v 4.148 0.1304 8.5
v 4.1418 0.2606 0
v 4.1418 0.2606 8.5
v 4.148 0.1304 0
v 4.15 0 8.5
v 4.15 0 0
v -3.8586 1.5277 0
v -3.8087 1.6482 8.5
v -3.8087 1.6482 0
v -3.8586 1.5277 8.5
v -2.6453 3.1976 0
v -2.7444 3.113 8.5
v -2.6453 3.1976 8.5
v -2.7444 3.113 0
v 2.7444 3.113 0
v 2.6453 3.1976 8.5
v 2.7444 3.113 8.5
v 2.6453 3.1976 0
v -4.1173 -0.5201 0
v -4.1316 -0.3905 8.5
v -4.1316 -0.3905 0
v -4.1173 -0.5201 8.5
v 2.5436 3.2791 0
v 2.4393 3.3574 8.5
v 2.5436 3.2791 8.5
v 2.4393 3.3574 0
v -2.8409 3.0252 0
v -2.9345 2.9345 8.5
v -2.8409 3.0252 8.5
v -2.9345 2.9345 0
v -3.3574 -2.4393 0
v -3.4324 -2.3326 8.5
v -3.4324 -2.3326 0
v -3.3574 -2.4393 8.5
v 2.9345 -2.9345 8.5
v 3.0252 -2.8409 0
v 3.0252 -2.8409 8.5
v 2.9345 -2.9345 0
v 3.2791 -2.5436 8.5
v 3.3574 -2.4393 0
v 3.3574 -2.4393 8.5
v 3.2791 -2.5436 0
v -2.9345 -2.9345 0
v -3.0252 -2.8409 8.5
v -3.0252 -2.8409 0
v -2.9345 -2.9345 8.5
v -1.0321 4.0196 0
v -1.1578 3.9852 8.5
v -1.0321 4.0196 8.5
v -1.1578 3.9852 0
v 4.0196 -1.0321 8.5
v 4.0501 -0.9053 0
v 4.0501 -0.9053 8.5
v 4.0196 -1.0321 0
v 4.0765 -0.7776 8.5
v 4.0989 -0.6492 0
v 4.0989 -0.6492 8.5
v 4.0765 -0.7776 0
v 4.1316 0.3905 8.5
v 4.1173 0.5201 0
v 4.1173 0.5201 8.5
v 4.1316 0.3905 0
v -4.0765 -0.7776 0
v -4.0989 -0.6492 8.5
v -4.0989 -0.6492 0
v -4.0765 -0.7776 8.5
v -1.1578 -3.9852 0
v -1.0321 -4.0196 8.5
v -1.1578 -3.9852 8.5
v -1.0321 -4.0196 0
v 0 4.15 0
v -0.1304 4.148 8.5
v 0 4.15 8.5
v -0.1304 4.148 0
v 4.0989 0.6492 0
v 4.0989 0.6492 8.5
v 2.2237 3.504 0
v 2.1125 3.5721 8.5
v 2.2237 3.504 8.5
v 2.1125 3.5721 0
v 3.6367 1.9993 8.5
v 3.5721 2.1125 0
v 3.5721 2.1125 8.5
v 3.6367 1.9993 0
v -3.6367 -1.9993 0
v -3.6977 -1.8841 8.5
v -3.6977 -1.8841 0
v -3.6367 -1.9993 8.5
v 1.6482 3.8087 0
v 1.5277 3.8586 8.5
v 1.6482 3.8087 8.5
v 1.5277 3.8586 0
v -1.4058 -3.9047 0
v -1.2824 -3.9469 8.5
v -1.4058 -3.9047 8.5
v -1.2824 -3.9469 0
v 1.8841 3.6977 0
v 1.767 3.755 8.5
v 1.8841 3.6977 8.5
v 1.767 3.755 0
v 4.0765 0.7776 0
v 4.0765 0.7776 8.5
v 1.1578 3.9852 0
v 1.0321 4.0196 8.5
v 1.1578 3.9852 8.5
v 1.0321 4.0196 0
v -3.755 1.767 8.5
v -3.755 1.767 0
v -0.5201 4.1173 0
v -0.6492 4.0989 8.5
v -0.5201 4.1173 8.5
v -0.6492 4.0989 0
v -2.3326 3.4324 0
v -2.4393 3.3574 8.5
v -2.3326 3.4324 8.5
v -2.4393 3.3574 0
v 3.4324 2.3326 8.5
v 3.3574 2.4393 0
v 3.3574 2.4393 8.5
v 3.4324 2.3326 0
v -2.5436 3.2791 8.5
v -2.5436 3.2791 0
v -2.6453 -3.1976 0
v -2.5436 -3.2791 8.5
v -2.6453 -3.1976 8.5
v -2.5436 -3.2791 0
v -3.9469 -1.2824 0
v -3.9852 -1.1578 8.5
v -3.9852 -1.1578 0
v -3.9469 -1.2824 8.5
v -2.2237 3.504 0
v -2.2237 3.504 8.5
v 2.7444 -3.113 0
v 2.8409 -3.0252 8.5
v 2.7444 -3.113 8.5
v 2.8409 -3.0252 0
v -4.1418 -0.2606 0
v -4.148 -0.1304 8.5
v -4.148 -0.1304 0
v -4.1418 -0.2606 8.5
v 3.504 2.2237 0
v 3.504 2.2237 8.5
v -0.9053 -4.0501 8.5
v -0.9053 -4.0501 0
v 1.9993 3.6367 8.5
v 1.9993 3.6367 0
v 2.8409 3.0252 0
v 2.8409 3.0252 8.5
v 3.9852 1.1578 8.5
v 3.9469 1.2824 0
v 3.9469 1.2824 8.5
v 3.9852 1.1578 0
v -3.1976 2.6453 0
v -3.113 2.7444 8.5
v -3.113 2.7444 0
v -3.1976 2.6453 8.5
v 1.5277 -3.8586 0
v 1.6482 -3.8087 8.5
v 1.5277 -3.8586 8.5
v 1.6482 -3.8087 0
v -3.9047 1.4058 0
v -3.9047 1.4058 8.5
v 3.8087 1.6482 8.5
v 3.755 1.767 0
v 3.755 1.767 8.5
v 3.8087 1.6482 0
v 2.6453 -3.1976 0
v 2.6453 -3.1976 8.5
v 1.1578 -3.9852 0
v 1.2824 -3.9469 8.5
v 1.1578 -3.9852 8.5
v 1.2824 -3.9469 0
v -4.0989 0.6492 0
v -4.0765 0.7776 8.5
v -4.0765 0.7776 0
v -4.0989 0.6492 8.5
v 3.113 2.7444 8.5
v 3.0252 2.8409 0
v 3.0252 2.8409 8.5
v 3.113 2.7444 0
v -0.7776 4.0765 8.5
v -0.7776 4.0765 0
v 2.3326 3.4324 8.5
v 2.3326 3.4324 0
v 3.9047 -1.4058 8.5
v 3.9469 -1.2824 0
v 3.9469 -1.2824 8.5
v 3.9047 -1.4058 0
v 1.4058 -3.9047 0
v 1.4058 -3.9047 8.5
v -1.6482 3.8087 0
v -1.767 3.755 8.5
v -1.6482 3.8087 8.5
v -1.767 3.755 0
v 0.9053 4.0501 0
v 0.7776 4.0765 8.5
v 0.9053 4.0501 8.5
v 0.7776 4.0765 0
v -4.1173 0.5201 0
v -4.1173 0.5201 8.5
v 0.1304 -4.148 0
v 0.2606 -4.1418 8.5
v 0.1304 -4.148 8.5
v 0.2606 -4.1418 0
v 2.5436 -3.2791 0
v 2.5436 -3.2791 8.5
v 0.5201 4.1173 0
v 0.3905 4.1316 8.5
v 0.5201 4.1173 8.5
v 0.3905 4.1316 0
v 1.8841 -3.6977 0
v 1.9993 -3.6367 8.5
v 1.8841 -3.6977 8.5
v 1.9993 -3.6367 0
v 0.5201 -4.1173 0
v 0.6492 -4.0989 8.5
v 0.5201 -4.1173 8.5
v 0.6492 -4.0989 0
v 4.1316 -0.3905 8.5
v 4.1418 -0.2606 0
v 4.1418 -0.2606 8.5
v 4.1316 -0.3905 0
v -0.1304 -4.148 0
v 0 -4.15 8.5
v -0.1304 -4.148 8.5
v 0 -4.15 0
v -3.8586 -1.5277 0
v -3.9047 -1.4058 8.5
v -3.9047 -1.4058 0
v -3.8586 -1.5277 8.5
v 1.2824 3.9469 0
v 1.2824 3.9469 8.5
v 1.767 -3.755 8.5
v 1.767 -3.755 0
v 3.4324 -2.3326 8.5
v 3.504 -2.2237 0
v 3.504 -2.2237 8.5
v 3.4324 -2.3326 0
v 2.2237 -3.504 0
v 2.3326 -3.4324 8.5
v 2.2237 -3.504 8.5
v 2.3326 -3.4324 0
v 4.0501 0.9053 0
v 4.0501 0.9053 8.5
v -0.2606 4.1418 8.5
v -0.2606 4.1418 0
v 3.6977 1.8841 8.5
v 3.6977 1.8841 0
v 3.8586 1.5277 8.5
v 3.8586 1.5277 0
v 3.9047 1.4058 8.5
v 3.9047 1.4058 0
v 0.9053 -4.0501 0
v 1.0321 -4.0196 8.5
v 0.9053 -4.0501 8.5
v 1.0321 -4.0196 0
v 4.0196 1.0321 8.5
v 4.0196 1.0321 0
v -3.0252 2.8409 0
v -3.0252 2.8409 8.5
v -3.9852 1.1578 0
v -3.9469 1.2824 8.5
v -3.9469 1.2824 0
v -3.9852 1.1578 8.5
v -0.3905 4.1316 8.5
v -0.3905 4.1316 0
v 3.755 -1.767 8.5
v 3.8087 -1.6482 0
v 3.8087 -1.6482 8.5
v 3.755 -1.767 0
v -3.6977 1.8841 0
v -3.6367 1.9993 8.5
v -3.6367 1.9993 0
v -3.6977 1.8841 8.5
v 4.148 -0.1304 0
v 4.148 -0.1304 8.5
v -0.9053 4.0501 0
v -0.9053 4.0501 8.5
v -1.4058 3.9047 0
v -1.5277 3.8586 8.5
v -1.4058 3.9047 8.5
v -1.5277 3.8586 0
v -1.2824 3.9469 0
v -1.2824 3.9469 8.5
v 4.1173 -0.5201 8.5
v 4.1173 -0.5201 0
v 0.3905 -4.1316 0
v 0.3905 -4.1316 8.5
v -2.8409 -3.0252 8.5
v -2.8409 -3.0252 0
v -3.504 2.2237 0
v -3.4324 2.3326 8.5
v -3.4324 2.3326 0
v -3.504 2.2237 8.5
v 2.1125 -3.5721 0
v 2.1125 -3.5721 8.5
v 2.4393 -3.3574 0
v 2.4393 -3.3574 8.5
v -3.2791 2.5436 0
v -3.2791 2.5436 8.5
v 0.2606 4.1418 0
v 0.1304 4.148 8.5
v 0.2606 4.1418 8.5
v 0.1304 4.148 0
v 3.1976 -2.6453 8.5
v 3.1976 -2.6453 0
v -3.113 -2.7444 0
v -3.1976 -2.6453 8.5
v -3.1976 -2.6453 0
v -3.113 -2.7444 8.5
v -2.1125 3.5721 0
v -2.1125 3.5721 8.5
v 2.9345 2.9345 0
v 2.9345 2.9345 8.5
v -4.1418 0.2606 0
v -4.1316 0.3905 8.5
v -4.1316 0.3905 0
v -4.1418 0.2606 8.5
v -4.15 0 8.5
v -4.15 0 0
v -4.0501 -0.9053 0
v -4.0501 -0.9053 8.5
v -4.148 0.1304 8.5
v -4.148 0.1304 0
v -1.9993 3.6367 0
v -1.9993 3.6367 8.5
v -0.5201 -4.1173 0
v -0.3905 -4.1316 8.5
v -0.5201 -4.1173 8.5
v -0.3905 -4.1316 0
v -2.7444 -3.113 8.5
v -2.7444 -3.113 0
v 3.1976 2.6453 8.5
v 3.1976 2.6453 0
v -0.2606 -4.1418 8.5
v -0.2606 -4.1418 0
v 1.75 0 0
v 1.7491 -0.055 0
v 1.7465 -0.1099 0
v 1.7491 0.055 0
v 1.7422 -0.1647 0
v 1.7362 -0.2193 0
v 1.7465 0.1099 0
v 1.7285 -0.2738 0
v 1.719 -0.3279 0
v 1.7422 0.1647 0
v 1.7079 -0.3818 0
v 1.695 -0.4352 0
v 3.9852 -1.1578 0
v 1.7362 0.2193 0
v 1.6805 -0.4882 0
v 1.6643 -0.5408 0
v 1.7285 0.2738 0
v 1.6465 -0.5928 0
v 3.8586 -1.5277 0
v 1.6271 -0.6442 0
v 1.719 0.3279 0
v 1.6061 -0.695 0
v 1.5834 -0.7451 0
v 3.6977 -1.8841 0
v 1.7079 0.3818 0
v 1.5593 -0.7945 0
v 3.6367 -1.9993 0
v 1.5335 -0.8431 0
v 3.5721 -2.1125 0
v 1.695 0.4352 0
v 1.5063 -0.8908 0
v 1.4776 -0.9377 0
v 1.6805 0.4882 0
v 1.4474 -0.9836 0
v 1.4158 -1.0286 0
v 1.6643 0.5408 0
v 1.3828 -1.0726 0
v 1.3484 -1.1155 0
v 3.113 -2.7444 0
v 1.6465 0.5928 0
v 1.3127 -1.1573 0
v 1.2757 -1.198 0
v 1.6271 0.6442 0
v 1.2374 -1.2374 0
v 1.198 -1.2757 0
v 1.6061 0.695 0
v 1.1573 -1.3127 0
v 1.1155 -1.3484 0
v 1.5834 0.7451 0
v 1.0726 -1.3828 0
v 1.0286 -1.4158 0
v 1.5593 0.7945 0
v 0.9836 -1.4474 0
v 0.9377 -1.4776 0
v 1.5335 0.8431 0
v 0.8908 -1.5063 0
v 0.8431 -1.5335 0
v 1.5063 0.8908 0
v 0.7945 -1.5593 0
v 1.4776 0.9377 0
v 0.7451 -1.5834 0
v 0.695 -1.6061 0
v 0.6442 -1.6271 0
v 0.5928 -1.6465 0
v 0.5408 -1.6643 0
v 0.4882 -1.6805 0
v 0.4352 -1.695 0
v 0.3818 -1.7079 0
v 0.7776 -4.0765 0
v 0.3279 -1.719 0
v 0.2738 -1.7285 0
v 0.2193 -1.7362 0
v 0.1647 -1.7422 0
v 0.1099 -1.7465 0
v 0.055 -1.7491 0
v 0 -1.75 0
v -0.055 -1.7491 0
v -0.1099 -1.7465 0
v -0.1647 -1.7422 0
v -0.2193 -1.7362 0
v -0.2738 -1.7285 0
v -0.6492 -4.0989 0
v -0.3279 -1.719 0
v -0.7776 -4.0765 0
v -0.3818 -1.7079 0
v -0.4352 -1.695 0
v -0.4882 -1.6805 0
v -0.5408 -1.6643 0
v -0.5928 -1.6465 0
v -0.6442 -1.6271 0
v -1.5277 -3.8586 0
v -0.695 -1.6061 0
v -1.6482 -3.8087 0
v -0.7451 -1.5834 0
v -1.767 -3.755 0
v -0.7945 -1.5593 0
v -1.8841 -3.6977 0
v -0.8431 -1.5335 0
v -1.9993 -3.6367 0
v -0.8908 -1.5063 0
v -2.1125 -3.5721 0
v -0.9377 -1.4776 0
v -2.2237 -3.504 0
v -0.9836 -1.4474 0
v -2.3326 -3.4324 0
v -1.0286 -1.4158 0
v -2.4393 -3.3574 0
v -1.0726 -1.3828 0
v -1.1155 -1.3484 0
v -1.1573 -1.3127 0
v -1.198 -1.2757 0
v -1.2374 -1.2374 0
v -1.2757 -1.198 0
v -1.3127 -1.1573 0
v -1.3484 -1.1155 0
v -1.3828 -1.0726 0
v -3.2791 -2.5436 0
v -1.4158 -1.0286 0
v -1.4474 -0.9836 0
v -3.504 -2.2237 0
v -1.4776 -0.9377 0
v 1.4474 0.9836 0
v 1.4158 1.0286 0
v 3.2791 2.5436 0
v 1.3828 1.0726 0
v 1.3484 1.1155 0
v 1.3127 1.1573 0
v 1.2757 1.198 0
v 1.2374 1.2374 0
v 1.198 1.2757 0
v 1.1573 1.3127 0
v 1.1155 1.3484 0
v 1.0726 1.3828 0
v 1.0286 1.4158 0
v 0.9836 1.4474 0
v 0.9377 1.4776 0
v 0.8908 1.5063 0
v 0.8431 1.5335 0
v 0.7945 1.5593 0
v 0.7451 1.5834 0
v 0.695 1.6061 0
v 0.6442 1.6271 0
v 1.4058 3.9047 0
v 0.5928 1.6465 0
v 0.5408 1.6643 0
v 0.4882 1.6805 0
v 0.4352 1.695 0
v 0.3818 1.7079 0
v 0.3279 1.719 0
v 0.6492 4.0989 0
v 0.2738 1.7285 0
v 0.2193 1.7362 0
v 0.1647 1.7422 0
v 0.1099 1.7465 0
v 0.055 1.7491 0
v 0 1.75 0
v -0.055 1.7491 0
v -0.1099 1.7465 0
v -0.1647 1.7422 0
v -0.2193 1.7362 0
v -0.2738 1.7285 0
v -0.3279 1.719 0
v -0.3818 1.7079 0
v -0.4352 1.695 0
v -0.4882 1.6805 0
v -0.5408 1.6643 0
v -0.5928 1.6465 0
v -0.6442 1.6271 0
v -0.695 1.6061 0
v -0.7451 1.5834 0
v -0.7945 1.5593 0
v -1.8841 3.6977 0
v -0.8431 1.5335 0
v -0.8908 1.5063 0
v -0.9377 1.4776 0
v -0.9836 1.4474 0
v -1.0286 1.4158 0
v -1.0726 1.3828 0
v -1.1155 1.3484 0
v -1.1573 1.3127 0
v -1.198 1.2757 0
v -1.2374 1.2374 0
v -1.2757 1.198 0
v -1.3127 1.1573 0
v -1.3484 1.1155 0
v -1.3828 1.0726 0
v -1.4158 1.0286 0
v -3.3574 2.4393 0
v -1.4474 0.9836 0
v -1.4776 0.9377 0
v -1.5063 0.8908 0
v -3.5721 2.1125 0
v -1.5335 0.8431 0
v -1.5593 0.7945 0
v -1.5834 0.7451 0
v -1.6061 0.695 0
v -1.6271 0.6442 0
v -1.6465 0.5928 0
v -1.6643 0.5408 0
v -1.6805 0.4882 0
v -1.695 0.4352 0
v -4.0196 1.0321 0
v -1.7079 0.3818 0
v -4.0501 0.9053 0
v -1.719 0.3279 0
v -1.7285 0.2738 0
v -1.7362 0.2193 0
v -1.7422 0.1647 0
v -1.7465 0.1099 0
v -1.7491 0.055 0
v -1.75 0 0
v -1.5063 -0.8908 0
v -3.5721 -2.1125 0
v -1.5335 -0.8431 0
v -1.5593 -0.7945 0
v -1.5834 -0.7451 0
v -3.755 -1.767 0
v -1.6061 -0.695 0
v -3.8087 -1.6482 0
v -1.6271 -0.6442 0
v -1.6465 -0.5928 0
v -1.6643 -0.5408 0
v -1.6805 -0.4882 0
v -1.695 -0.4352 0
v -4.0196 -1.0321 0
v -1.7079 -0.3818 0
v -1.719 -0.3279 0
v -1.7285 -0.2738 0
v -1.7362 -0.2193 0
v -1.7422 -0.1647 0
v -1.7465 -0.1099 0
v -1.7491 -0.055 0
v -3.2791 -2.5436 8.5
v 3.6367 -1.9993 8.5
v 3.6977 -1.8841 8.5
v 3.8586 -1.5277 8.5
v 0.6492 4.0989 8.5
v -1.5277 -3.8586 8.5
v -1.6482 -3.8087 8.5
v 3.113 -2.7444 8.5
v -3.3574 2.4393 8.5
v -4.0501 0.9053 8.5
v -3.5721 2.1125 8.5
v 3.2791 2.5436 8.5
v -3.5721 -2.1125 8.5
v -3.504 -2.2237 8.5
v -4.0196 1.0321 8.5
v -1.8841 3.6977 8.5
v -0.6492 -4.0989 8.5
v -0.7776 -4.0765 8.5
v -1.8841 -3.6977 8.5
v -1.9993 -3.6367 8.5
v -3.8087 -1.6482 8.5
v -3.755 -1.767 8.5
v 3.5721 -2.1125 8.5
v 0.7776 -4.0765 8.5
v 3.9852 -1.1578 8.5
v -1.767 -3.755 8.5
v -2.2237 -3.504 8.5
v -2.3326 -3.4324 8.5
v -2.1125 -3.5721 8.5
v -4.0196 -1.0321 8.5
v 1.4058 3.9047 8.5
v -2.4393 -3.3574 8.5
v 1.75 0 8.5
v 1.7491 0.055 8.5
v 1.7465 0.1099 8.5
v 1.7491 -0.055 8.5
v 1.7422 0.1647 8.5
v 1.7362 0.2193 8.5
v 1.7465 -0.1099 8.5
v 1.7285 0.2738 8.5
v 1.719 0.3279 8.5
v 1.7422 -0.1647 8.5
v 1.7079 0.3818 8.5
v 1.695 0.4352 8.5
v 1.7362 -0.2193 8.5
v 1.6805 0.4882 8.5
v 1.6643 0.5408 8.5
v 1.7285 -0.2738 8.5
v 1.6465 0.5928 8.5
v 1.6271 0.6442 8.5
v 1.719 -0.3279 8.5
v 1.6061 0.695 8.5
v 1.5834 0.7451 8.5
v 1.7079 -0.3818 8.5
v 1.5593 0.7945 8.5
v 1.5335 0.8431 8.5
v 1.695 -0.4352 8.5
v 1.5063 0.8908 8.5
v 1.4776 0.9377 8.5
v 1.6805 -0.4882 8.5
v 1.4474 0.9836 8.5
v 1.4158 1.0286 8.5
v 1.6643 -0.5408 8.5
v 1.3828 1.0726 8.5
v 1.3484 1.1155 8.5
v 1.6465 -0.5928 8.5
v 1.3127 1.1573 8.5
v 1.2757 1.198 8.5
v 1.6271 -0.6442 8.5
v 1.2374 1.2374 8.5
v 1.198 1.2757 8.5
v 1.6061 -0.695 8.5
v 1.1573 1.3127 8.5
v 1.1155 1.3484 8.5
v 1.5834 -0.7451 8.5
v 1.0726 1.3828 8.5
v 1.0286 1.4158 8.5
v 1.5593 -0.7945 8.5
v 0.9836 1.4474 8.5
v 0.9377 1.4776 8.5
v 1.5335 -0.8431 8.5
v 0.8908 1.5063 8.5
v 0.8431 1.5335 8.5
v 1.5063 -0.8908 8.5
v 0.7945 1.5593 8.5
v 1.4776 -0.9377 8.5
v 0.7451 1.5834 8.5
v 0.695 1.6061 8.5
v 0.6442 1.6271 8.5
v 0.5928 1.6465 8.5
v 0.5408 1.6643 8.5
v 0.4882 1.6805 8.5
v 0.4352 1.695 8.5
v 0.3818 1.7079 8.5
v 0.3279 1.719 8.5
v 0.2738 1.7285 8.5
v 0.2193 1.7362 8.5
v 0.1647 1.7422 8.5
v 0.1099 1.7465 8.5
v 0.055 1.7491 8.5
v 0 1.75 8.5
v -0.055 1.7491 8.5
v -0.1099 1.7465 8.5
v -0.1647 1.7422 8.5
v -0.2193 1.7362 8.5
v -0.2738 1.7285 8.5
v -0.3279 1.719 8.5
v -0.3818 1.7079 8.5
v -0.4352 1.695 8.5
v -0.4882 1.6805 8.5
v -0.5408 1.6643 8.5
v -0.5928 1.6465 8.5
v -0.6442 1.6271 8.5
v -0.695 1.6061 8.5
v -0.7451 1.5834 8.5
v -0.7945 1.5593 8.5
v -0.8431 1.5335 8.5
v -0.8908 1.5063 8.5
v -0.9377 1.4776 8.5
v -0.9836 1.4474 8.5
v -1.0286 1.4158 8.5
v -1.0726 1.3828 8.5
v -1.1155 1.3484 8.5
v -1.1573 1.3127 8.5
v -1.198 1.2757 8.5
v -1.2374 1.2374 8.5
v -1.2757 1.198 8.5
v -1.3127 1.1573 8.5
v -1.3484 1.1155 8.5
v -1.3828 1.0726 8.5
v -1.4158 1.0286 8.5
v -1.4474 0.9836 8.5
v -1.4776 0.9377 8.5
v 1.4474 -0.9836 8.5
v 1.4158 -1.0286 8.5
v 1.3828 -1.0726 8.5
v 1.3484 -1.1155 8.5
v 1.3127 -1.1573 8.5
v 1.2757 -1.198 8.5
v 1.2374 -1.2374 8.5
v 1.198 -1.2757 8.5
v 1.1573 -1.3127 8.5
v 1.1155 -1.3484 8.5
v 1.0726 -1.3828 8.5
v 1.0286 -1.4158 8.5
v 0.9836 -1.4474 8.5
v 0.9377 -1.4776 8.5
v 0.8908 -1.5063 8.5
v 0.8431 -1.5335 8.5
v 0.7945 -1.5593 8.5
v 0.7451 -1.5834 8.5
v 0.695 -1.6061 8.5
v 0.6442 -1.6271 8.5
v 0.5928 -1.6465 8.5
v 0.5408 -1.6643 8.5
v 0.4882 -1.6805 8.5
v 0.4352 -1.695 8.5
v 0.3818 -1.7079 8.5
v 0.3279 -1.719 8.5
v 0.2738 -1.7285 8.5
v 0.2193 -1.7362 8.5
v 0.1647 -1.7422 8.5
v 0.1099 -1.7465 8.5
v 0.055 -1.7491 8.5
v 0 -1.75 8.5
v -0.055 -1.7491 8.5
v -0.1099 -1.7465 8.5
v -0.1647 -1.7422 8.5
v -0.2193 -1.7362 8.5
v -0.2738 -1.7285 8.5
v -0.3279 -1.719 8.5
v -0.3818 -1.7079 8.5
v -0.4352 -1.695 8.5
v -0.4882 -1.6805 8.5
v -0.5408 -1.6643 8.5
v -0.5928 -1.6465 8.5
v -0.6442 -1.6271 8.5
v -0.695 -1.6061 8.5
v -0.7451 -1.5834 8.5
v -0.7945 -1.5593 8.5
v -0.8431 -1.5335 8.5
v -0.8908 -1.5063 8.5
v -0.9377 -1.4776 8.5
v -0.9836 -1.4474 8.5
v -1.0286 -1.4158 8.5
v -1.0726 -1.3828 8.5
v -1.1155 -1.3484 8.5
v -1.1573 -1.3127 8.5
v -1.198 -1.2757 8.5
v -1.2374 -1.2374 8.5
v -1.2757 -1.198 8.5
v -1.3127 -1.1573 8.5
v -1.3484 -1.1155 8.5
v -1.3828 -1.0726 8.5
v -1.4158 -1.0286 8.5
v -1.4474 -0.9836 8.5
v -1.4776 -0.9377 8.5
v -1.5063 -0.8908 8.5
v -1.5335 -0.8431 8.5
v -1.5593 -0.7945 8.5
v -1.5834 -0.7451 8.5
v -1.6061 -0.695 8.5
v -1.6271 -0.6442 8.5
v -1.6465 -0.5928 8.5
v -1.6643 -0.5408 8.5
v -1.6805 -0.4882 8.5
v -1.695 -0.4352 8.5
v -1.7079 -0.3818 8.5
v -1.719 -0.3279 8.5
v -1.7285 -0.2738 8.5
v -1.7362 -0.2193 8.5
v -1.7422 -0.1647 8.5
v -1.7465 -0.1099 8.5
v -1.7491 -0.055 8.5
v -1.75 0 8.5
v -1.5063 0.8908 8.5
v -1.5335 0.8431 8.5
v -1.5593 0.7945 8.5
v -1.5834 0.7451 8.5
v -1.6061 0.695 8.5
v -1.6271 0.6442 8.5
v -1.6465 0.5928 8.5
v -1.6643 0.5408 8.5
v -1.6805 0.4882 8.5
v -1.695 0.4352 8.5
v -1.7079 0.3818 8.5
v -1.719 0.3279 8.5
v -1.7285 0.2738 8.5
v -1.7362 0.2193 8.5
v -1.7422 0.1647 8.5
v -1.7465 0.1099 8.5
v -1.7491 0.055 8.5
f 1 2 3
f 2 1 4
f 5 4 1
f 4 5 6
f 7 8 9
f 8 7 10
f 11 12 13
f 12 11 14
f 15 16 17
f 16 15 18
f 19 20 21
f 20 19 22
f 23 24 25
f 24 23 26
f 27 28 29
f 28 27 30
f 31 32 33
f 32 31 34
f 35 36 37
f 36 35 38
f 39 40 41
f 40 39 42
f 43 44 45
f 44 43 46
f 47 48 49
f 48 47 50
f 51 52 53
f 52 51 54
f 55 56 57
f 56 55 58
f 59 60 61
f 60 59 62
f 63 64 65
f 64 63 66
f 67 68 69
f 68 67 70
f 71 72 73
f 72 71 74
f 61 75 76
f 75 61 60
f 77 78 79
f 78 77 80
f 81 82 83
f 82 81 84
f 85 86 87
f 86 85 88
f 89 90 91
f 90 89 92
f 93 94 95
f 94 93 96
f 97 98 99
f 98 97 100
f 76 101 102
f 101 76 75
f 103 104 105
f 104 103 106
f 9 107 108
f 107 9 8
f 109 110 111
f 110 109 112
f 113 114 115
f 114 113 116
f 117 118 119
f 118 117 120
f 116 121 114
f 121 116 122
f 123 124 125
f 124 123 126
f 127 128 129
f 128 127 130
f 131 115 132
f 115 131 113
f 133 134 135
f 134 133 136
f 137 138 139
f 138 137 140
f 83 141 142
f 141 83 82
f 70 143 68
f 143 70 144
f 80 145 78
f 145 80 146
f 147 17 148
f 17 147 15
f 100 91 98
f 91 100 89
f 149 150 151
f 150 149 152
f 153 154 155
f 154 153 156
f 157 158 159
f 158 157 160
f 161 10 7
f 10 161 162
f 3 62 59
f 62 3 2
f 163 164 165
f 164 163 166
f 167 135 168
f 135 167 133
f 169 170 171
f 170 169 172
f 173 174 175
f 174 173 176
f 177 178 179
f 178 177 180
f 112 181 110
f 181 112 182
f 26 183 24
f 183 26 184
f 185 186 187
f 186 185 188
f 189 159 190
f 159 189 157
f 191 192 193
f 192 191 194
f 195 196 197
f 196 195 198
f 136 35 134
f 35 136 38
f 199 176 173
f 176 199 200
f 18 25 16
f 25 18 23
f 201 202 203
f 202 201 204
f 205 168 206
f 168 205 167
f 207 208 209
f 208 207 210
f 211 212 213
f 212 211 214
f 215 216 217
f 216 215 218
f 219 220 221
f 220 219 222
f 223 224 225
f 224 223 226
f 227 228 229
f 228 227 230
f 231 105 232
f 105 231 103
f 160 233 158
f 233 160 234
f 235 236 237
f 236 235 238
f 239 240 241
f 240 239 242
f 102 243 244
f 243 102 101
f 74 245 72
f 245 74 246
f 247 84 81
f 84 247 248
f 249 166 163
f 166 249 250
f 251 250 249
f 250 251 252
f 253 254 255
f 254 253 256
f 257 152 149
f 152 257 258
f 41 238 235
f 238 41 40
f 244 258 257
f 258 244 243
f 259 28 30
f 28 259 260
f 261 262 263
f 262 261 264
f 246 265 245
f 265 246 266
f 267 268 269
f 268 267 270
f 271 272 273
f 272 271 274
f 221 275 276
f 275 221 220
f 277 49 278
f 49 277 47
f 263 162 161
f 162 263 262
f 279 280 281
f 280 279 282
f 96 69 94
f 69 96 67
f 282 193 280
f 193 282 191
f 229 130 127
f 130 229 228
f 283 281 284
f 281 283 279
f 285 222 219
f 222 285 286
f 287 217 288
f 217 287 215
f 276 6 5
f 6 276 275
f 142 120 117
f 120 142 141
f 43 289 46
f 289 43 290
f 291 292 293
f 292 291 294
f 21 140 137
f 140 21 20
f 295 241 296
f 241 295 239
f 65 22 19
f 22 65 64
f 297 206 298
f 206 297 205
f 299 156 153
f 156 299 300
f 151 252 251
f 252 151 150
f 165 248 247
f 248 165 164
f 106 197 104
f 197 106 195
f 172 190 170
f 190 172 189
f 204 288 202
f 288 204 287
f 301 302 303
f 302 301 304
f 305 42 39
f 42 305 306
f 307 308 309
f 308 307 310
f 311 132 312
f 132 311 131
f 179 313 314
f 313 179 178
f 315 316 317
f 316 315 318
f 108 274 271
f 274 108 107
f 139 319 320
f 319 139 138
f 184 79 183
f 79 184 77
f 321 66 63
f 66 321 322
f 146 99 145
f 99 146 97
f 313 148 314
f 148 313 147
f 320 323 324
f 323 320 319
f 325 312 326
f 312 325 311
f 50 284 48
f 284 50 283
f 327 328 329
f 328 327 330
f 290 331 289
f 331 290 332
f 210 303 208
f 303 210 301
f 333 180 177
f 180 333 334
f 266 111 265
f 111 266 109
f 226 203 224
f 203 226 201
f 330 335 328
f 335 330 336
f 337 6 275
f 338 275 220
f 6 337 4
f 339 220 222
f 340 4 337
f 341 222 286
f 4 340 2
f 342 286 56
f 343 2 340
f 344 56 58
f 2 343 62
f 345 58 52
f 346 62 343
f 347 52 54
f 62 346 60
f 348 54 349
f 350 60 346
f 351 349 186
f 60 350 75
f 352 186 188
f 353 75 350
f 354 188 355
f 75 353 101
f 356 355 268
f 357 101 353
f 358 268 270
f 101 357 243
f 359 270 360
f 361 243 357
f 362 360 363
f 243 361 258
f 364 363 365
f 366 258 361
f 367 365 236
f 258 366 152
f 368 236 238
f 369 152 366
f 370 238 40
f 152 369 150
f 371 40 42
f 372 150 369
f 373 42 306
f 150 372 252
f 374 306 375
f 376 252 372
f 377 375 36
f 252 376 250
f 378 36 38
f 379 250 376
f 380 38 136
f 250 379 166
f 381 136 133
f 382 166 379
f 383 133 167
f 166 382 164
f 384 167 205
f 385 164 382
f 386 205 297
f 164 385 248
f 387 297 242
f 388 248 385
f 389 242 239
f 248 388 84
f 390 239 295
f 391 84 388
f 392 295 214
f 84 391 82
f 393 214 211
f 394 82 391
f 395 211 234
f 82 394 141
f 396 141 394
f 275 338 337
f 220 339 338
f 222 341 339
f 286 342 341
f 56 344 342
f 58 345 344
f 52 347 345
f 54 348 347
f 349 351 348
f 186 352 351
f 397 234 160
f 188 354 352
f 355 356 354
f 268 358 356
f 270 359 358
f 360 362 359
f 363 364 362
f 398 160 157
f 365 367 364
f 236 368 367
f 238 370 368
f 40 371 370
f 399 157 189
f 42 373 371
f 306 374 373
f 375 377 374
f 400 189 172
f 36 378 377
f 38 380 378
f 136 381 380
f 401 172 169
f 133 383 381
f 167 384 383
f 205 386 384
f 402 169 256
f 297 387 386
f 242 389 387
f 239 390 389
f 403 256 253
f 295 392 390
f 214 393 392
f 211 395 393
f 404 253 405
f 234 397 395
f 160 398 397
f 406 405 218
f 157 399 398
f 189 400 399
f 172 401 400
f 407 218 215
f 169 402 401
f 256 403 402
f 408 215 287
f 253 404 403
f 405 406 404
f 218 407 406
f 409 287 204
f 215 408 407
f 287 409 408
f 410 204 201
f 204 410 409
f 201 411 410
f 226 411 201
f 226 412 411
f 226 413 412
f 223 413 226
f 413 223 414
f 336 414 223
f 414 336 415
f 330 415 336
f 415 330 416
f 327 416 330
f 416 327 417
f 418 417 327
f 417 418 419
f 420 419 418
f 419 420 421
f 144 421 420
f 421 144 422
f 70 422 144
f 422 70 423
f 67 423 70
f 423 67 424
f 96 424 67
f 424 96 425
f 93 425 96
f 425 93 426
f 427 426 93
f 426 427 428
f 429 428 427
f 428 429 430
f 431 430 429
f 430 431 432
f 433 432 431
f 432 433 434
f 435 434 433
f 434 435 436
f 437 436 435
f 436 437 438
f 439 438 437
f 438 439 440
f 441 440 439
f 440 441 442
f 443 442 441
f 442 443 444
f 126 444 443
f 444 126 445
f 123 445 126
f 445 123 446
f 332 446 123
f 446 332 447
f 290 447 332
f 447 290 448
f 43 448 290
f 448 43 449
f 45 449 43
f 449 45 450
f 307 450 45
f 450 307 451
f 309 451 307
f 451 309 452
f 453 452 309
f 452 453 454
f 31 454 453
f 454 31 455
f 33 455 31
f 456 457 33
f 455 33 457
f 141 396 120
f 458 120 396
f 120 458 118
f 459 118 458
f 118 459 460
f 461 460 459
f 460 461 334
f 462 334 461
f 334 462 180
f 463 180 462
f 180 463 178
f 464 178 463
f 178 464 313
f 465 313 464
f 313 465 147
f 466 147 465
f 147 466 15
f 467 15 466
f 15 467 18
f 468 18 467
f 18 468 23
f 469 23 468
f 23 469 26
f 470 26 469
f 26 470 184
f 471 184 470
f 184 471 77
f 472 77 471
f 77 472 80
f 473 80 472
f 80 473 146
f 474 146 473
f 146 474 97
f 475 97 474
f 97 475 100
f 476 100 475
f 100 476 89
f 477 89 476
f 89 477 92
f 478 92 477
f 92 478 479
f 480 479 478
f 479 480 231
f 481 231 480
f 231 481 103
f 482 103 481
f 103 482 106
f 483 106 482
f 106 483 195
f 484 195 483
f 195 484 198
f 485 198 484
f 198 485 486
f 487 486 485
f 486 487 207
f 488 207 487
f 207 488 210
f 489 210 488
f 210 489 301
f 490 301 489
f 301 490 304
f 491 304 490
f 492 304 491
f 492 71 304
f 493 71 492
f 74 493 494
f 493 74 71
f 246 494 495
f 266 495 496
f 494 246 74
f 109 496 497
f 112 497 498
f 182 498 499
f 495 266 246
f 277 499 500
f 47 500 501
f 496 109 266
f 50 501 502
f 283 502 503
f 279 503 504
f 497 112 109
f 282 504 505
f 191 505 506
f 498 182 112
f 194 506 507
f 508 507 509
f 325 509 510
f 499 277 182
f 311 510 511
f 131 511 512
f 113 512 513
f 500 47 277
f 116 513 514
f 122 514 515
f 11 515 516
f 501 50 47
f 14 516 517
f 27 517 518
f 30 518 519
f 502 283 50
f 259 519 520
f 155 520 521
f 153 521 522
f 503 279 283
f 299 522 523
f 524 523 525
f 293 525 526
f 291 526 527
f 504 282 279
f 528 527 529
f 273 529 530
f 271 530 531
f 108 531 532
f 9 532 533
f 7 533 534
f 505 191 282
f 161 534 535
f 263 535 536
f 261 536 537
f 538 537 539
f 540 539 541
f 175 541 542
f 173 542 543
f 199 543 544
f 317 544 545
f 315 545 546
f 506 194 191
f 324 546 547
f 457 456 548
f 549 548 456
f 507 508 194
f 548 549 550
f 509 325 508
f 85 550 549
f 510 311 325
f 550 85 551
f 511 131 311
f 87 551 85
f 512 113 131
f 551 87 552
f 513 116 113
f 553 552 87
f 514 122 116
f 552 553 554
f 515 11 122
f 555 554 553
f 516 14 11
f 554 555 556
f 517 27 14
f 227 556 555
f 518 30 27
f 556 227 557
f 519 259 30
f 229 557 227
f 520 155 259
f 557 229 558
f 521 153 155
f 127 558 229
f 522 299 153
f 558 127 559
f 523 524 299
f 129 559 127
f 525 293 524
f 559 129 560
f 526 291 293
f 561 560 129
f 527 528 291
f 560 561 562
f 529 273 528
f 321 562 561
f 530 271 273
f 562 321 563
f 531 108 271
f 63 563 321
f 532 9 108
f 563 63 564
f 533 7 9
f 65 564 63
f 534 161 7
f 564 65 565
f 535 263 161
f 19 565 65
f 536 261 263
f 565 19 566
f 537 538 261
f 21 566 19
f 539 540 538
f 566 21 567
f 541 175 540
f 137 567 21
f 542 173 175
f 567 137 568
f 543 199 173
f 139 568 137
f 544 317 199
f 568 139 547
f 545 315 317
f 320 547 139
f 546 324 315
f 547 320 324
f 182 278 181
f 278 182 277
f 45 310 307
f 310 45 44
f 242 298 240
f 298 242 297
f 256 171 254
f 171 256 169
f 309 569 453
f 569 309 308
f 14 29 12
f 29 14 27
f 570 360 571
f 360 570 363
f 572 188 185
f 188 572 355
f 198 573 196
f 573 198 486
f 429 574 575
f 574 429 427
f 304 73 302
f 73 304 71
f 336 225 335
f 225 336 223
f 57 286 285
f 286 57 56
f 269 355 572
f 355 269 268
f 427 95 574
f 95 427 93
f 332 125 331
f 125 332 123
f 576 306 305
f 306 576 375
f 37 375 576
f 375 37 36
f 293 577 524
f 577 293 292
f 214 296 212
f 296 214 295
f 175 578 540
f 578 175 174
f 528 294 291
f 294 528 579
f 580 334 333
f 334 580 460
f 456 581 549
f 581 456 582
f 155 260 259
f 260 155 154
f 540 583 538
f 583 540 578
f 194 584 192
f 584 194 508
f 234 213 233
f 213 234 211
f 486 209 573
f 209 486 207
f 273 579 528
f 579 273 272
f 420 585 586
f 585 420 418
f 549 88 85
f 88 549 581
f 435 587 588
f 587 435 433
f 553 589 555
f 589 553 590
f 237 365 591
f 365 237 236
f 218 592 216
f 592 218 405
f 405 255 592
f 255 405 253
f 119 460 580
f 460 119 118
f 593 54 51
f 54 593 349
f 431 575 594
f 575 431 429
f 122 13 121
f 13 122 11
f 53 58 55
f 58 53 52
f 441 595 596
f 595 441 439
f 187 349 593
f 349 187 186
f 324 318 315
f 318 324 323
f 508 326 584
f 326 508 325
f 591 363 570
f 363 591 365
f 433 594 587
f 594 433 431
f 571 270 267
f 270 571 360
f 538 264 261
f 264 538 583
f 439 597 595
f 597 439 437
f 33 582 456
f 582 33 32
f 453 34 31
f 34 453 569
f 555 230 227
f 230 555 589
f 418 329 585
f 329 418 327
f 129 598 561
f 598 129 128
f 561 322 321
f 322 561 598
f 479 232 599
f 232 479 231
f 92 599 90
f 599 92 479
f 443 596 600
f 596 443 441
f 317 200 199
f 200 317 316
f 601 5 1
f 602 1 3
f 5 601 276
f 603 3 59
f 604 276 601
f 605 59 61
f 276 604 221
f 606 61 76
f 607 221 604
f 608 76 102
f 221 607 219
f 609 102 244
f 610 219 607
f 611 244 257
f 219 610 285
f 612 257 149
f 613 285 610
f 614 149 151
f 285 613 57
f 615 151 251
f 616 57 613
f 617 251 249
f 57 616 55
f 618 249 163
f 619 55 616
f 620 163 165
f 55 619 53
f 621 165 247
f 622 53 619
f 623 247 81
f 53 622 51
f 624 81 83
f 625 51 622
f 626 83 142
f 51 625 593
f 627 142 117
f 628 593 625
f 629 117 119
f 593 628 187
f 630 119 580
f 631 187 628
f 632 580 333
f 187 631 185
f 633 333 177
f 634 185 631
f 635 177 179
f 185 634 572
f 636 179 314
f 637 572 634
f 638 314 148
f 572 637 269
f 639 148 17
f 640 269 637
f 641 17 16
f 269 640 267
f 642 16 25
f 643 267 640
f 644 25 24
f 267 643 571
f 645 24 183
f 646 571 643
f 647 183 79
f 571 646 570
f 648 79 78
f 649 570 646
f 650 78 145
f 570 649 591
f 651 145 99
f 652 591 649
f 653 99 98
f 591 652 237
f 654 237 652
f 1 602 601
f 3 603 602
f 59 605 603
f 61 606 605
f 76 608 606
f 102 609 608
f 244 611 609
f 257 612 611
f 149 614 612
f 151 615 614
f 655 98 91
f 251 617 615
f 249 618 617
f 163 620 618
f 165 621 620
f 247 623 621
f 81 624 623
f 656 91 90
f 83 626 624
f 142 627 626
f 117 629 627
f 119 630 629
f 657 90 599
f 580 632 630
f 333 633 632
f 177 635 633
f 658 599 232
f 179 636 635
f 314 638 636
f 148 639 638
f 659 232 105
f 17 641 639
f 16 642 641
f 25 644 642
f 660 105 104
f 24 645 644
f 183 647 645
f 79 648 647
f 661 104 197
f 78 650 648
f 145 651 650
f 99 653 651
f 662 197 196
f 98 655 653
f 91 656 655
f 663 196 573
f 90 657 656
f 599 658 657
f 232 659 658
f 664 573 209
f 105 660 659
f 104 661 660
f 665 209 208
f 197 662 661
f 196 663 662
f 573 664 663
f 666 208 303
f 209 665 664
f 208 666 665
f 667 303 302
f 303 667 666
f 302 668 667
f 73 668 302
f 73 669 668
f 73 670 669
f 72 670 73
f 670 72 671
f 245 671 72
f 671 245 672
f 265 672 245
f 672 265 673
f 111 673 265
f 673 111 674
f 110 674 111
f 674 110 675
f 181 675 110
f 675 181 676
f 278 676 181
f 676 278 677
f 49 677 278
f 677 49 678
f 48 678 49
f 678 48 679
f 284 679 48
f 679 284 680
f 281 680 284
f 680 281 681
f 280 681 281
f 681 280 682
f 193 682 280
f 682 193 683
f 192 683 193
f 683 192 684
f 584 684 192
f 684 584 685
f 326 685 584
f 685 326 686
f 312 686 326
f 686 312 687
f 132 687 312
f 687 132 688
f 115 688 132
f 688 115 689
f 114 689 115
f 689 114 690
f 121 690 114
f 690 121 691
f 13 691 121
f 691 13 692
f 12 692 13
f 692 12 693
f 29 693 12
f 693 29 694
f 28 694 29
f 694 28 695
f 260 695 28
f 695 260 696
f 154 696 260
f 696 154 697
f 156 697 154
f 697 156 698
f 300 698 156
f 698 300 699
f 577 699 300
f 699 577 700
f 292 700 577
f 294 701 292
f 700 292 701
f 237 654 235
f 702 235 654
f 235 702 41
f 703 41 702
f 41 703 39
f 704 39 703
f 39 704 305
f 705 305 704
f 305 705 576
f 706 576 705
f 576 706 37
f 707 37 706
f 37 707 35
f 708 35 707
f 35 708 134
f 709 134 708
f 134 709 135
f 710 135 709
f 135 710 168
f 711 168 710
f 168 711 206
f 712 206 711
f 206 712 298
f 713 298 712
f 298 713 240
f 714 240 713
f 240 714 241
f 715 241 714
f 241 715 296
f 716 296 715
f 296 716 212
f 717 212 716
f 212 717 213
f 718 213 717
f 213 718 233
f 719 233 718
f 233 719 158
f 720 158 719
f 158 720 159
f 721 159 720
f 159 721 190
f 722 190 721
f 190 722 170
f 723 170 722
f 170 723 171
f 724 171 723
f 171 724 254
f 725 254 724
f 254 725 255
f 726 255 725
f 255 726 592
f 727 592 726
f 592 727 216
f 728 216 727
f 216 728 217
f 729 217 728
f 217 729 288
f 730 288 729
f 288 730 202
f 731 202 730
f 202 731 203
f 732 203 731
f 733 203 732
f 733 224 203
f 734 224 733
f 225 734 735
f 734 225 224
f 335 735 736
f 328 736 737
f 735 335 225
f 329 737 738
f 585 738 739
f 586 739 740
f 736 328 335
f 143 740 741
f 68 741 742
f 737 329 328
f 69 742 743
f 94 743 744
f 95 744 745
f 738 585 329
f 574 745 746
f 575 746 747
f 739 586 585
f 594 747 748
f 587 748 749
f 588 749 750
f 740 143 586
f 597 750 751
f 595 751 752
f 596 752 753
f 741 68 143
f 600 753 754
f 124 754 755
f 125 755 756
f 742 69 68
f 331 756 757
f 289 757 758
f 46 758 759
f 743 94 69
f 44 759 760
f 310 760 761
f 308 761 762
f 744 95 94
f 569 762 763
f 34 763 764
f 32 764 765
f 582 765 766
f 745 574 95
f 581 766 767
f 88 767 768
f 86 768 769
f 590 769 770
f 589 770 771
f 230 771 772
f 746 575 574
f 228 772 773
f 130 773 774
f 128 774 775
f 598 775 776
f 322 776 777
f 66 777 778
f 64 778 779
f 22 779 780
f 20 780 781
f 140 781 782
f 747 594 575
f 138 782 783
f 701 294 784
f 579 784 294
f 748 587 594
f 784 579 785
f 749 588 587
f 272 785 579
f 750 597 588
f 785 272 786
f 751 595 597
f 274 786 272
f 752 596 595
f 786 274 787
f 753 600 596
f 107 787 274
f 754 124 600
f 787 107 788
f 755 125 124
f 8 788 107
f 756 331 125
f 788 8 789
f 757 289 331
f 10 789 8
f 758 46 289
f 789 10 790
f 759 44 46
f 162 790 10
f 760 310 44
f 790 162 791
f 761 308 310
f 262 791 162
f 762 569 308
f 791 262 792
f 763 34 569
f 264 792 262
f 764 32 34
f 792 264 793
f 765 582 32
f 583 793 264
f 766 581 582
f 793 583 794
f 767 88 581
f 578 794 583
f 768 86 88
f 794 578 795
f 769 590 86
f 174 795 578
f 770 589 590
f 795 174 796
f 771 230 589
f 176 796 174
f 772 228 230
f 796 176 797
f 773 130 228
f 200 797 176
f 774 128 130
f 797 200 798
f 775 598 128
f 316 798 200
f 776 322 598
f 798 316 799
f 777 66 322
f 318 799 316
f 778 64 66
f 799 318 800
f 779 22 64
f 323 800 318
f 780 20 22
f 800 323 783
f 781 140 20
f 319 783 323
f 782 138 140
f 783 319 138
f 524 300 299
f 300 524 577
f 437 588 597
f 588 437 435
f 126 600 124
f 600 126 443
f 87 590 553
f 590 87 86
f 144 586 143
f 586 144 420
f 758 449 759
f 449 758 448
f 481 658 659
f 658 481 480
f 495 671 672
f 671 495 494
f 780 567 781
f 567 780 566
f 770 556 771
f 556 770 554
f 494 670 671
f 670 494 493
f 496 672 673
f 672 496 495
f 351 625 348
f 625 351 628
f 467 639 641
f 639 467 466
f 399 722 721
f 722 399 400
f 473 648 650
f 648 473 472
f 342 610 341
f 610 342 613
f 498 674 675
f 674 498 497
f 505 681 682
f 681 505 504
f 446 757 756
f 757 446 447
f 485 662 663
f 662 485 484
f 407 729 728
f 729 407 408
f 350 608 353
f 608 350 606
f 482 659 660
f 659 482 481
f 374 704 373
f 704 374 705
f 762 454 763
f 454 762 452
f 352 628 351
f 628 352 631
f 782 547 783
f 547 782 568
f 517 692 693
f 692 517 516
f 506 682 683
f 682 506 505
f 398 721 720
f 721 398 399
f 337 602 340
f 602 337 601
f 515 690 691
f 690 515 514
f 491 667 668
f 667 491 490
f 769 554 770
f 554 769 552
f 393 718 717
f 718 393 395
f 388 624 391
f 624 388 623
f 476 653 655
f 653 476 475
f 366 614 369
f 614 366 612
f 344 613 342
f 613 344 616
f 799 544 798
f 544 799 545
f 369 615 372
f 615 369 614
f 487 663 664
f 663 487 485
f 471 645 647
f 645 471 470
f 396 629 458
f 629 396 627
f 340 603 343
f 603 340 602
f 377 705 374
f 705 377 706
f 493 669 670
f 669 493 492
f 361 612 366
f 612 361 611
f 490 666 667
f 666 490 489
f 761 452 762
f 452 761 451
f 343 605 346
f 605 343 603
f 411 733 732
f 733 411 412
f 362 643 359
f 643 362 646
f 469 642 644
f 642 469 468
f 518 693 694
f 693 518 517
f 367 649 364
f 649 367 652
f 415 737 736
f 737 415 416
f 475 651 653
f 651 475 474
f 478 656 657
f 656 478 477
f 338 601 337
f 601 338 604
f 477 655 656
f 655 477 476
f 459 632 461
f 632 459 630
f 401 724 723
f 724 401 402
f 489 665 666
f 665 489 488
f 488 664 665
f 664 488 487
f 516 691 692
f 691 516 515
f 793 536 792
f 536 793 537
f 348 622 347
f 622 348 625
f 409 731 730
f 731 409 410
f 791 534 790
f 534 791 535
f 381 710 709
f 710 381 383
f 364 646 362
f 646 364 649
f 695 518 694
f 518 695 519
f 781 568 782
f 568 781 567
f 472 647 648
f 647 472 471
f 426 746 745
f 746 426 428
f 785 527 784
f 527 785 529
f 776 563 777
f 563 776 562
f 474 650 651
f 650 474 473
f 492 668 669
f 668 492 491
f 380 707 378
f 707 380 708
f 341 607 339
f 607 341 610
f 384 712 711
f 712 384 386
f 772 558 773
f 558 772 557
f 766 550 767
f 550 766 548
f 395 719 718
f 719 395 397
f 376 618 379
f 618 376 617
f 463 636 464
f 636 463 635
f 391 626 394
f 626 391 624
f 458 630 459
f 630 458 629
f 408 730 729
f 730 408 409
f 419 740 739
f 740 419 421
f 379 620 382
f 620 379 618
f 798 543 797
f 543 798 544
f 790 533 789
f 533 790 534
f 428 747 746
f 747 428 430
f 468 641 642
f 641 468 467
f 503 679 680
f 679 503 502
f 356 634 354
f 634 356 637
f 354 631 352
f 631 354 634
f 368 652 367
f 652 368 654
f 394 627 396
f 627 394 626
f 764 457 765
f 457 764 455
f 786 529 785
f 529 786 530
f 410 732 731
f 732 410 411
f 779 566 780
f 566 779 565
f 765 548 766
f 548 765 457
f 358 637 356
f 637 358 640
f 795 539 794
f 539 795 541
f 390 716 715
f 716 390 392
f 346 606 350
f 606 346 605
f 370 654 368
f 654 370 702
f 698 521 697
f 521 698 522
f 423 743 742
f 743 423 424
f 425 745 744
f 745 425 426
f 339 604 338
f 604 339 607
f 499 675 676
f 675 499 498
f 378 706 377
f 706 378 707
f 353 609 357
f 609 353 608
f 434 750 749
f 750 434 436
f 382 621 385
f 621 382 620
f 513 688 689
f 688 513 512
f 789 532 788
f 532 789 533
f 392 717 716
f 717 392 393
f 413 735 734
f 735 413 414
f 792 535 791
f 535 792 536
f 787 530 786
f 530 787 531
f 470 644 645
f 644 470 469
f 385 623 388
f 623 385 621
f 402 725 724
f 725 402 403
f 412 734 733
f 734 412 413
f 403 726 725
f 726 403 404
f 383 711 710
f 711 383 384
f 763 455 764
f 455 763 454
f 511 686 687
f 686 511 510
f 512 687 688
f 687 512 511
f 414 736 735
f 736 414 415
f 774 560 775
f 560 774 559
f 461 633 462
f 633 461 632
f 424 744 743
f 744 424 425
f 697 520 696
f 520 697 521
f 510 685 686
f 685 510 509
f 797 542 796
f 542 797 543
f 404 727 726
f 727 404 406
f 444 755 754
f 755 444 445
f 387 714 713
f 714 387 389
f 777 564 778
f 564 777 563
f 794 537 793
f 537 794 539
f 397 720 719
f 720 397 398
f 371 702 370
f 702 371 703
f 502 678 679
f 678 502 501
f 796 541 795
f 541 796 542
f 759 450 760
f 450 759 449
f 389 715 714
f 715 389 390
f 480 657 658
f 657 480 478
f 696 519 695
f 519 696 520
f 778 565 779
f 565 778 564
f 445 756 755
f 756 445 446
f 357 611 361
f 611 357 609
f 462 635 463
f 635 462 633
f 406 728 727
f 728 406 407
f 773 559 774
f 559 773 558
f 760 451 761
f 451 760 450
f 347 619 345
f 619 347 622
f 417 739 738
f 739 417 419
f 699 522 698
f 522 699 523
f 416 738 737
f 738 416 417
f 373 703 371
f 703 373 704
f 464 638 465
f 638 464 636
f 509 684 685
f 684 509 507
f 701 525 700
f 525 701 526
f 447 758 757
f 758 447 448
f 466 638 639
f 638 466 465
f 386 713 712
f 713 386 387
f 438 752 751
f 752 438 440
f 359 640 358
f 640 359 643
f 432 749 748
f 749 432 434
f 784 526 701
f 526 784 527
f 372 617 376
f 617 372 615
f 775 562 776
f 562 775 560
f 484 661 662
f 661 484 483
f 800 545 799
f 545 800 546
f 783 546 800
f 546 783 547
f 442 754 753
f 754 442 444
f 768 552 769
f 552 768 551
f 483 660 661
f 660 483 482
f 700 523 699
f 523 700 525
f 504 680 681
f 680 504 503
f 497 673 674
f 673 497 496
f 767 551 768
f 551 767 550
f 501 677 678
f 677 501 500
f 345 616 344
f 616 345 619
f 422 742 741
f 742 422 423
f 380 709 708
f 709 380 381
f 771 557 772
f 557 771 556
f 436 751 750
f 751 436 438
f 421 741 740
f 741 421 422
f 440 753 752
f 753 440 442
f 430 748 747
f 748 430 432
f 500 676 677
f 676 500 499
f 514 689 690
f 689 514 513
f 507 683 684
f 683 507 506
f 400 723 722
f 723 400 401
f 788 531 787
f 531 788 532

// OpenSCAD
// file: ../configurations/global.scad
// gold_number = 1.618;

housing_facades_throws_diameter = 3.8;

// external size
case_external_x_size = 165;
case_external_y_size = 92;
case_external_z_size = 38;
case_external_panes_thickness = 4.8;

facade_front_round_edges_radius = 5;
facade_throws_margin = 5;

// facade corners
facade_corners_offset_lenght = 9;
facade_corners_main_x_size = 19;
facade_corners_main_y_size = 19;
facade_corners_main_thickness = 11;
facade_corners_correction_offset_length = 0.2;
facade_corners_correction_offset_thickness = 0.0;
facade_fn = 100;


// Generics
insert_throw_diameter = 4.2;
insert_throw_length = 6 + 2;


// mother board
mother_board_cny70set_x_point_coord = 10;
mother_board_cny70set_y_point_coord = 7;



// Cassette
cassette_x_size = 50;
cassette_y_size = 31;
cassette_z_size = 4.8;
cassette_round_radius = 4;

// Cassette case
cassette_case_x_size = 76.2;
cassette_case_y_size = 55.88;
cassette_case_z_size = 9;
cassette_case_round_radius = 1;

cassette_case_x_y_margin = 0.75;

cassette_case_embed_x_size = 62;
cassette_case_embed_y_size = 42;
cassette_case_embed_z_size = 4.8;
cassette_case_embed_offsets = 10;
cassette_case_embed_round_radius = 6;

cassette_case_throws_margin = 2.54 * 2;
cassette_case_throws_diameter = 3.5;
cassette_case_grip_enveloppe_diameter = 15;
cassette_case_grip_enveloppe_offset = 3;

cassette_case_cny70set_x_point_coord = mother_board_cny70set_x_point_coord;
cassette_case_cny70set_y_point_coord = mother_board_cny70set_y_point_coord;
cassette_case_cny70set_x_y_margin = 0.5;

// Front panel throw cassette case mounting 
cassette_case_embed_throw_margin = 0.5;


// Mother board joins
bolt_join_mother_board_internal_diameter = 3.5;
bolt_join_mother_board_external_diameter = 3.5 + (0.4 * 12);
bolt_join_mother_board_height = 8.5;
bolt_join_fn = 200;


// speaker facade
speaker_facade_x_size = 50;
speaker_facade_y_size = cassette_case_y_size - cassette_case_throws_margin * 2 + 7;
speaker_facade_z_size = 2;
speaker_facade_rounded_radius = 3;
speaker_facade_fixation_throws_margin = 3.5;
speaker_facade_fixation_throws_diameter = 3.5;
speaker_facade_throw_diameter = 40+1;
// 
facade_top_on_off_button_throw_diameter = 12.8;


facade_cassette_case_coords = [
    60 + 5,
    23,
];

facade_speaker_40mm_coords = [
    32 + 5,
    facade_cassette_case_coords[1] + (cassette_case_y_size / 2),
];

batteries_holder_coords = [
    8 + 5,
    20
];

volume_buttons_spacing = 20;
//volume_buttons_coords = [145,50];
volume_buttons_coords = [
    145 + 5 ,
    facade_cassette_case_coords[1] + (cassette_case_y_size / 2),
];

controller_buttons_spacing = 20;
//controller_buttons_coords = [98,14];
controller_buttons_coords = [
    facade_cassette_case_coords[0] + (cassette_case_x_size / 2),
    14
];

controller_onoff_coords = [
    32 + 5,
    14
];
// main file
include <../configurations/global.scad>

/**
 * boltJoinMotherBoardPiece
 * @name boltJoinMotherBoardPiece
 * @description Joins to hold mother board
 * @type piece
 * @parent motherBoardComponent
 * @stl
 */
module boltJoinMotherBoardPiece(
    internal_diameter = bolt_join_mother_board_internal_diameter,
    external_diameter = bolt_join_mother_board_external_diameter,
    height = bolt_join_mother_board_height,
    _fn = bolt_join_fn
) {
    difference() {
        cylinder(d = external_diameter, h = height, center = false, $fn = _fn);

        translate([0,0,-0.1])
            cylinder(d = internal_diameter, h = height * 2 + 0.1 * 2, center = false, $fn = _fn);
    }
}


/**
 * @stl
 * @png
 * @colorscheme BeforeDawn
 * @view axes,scales
 */
boltJoinMotherBoardPiece();
